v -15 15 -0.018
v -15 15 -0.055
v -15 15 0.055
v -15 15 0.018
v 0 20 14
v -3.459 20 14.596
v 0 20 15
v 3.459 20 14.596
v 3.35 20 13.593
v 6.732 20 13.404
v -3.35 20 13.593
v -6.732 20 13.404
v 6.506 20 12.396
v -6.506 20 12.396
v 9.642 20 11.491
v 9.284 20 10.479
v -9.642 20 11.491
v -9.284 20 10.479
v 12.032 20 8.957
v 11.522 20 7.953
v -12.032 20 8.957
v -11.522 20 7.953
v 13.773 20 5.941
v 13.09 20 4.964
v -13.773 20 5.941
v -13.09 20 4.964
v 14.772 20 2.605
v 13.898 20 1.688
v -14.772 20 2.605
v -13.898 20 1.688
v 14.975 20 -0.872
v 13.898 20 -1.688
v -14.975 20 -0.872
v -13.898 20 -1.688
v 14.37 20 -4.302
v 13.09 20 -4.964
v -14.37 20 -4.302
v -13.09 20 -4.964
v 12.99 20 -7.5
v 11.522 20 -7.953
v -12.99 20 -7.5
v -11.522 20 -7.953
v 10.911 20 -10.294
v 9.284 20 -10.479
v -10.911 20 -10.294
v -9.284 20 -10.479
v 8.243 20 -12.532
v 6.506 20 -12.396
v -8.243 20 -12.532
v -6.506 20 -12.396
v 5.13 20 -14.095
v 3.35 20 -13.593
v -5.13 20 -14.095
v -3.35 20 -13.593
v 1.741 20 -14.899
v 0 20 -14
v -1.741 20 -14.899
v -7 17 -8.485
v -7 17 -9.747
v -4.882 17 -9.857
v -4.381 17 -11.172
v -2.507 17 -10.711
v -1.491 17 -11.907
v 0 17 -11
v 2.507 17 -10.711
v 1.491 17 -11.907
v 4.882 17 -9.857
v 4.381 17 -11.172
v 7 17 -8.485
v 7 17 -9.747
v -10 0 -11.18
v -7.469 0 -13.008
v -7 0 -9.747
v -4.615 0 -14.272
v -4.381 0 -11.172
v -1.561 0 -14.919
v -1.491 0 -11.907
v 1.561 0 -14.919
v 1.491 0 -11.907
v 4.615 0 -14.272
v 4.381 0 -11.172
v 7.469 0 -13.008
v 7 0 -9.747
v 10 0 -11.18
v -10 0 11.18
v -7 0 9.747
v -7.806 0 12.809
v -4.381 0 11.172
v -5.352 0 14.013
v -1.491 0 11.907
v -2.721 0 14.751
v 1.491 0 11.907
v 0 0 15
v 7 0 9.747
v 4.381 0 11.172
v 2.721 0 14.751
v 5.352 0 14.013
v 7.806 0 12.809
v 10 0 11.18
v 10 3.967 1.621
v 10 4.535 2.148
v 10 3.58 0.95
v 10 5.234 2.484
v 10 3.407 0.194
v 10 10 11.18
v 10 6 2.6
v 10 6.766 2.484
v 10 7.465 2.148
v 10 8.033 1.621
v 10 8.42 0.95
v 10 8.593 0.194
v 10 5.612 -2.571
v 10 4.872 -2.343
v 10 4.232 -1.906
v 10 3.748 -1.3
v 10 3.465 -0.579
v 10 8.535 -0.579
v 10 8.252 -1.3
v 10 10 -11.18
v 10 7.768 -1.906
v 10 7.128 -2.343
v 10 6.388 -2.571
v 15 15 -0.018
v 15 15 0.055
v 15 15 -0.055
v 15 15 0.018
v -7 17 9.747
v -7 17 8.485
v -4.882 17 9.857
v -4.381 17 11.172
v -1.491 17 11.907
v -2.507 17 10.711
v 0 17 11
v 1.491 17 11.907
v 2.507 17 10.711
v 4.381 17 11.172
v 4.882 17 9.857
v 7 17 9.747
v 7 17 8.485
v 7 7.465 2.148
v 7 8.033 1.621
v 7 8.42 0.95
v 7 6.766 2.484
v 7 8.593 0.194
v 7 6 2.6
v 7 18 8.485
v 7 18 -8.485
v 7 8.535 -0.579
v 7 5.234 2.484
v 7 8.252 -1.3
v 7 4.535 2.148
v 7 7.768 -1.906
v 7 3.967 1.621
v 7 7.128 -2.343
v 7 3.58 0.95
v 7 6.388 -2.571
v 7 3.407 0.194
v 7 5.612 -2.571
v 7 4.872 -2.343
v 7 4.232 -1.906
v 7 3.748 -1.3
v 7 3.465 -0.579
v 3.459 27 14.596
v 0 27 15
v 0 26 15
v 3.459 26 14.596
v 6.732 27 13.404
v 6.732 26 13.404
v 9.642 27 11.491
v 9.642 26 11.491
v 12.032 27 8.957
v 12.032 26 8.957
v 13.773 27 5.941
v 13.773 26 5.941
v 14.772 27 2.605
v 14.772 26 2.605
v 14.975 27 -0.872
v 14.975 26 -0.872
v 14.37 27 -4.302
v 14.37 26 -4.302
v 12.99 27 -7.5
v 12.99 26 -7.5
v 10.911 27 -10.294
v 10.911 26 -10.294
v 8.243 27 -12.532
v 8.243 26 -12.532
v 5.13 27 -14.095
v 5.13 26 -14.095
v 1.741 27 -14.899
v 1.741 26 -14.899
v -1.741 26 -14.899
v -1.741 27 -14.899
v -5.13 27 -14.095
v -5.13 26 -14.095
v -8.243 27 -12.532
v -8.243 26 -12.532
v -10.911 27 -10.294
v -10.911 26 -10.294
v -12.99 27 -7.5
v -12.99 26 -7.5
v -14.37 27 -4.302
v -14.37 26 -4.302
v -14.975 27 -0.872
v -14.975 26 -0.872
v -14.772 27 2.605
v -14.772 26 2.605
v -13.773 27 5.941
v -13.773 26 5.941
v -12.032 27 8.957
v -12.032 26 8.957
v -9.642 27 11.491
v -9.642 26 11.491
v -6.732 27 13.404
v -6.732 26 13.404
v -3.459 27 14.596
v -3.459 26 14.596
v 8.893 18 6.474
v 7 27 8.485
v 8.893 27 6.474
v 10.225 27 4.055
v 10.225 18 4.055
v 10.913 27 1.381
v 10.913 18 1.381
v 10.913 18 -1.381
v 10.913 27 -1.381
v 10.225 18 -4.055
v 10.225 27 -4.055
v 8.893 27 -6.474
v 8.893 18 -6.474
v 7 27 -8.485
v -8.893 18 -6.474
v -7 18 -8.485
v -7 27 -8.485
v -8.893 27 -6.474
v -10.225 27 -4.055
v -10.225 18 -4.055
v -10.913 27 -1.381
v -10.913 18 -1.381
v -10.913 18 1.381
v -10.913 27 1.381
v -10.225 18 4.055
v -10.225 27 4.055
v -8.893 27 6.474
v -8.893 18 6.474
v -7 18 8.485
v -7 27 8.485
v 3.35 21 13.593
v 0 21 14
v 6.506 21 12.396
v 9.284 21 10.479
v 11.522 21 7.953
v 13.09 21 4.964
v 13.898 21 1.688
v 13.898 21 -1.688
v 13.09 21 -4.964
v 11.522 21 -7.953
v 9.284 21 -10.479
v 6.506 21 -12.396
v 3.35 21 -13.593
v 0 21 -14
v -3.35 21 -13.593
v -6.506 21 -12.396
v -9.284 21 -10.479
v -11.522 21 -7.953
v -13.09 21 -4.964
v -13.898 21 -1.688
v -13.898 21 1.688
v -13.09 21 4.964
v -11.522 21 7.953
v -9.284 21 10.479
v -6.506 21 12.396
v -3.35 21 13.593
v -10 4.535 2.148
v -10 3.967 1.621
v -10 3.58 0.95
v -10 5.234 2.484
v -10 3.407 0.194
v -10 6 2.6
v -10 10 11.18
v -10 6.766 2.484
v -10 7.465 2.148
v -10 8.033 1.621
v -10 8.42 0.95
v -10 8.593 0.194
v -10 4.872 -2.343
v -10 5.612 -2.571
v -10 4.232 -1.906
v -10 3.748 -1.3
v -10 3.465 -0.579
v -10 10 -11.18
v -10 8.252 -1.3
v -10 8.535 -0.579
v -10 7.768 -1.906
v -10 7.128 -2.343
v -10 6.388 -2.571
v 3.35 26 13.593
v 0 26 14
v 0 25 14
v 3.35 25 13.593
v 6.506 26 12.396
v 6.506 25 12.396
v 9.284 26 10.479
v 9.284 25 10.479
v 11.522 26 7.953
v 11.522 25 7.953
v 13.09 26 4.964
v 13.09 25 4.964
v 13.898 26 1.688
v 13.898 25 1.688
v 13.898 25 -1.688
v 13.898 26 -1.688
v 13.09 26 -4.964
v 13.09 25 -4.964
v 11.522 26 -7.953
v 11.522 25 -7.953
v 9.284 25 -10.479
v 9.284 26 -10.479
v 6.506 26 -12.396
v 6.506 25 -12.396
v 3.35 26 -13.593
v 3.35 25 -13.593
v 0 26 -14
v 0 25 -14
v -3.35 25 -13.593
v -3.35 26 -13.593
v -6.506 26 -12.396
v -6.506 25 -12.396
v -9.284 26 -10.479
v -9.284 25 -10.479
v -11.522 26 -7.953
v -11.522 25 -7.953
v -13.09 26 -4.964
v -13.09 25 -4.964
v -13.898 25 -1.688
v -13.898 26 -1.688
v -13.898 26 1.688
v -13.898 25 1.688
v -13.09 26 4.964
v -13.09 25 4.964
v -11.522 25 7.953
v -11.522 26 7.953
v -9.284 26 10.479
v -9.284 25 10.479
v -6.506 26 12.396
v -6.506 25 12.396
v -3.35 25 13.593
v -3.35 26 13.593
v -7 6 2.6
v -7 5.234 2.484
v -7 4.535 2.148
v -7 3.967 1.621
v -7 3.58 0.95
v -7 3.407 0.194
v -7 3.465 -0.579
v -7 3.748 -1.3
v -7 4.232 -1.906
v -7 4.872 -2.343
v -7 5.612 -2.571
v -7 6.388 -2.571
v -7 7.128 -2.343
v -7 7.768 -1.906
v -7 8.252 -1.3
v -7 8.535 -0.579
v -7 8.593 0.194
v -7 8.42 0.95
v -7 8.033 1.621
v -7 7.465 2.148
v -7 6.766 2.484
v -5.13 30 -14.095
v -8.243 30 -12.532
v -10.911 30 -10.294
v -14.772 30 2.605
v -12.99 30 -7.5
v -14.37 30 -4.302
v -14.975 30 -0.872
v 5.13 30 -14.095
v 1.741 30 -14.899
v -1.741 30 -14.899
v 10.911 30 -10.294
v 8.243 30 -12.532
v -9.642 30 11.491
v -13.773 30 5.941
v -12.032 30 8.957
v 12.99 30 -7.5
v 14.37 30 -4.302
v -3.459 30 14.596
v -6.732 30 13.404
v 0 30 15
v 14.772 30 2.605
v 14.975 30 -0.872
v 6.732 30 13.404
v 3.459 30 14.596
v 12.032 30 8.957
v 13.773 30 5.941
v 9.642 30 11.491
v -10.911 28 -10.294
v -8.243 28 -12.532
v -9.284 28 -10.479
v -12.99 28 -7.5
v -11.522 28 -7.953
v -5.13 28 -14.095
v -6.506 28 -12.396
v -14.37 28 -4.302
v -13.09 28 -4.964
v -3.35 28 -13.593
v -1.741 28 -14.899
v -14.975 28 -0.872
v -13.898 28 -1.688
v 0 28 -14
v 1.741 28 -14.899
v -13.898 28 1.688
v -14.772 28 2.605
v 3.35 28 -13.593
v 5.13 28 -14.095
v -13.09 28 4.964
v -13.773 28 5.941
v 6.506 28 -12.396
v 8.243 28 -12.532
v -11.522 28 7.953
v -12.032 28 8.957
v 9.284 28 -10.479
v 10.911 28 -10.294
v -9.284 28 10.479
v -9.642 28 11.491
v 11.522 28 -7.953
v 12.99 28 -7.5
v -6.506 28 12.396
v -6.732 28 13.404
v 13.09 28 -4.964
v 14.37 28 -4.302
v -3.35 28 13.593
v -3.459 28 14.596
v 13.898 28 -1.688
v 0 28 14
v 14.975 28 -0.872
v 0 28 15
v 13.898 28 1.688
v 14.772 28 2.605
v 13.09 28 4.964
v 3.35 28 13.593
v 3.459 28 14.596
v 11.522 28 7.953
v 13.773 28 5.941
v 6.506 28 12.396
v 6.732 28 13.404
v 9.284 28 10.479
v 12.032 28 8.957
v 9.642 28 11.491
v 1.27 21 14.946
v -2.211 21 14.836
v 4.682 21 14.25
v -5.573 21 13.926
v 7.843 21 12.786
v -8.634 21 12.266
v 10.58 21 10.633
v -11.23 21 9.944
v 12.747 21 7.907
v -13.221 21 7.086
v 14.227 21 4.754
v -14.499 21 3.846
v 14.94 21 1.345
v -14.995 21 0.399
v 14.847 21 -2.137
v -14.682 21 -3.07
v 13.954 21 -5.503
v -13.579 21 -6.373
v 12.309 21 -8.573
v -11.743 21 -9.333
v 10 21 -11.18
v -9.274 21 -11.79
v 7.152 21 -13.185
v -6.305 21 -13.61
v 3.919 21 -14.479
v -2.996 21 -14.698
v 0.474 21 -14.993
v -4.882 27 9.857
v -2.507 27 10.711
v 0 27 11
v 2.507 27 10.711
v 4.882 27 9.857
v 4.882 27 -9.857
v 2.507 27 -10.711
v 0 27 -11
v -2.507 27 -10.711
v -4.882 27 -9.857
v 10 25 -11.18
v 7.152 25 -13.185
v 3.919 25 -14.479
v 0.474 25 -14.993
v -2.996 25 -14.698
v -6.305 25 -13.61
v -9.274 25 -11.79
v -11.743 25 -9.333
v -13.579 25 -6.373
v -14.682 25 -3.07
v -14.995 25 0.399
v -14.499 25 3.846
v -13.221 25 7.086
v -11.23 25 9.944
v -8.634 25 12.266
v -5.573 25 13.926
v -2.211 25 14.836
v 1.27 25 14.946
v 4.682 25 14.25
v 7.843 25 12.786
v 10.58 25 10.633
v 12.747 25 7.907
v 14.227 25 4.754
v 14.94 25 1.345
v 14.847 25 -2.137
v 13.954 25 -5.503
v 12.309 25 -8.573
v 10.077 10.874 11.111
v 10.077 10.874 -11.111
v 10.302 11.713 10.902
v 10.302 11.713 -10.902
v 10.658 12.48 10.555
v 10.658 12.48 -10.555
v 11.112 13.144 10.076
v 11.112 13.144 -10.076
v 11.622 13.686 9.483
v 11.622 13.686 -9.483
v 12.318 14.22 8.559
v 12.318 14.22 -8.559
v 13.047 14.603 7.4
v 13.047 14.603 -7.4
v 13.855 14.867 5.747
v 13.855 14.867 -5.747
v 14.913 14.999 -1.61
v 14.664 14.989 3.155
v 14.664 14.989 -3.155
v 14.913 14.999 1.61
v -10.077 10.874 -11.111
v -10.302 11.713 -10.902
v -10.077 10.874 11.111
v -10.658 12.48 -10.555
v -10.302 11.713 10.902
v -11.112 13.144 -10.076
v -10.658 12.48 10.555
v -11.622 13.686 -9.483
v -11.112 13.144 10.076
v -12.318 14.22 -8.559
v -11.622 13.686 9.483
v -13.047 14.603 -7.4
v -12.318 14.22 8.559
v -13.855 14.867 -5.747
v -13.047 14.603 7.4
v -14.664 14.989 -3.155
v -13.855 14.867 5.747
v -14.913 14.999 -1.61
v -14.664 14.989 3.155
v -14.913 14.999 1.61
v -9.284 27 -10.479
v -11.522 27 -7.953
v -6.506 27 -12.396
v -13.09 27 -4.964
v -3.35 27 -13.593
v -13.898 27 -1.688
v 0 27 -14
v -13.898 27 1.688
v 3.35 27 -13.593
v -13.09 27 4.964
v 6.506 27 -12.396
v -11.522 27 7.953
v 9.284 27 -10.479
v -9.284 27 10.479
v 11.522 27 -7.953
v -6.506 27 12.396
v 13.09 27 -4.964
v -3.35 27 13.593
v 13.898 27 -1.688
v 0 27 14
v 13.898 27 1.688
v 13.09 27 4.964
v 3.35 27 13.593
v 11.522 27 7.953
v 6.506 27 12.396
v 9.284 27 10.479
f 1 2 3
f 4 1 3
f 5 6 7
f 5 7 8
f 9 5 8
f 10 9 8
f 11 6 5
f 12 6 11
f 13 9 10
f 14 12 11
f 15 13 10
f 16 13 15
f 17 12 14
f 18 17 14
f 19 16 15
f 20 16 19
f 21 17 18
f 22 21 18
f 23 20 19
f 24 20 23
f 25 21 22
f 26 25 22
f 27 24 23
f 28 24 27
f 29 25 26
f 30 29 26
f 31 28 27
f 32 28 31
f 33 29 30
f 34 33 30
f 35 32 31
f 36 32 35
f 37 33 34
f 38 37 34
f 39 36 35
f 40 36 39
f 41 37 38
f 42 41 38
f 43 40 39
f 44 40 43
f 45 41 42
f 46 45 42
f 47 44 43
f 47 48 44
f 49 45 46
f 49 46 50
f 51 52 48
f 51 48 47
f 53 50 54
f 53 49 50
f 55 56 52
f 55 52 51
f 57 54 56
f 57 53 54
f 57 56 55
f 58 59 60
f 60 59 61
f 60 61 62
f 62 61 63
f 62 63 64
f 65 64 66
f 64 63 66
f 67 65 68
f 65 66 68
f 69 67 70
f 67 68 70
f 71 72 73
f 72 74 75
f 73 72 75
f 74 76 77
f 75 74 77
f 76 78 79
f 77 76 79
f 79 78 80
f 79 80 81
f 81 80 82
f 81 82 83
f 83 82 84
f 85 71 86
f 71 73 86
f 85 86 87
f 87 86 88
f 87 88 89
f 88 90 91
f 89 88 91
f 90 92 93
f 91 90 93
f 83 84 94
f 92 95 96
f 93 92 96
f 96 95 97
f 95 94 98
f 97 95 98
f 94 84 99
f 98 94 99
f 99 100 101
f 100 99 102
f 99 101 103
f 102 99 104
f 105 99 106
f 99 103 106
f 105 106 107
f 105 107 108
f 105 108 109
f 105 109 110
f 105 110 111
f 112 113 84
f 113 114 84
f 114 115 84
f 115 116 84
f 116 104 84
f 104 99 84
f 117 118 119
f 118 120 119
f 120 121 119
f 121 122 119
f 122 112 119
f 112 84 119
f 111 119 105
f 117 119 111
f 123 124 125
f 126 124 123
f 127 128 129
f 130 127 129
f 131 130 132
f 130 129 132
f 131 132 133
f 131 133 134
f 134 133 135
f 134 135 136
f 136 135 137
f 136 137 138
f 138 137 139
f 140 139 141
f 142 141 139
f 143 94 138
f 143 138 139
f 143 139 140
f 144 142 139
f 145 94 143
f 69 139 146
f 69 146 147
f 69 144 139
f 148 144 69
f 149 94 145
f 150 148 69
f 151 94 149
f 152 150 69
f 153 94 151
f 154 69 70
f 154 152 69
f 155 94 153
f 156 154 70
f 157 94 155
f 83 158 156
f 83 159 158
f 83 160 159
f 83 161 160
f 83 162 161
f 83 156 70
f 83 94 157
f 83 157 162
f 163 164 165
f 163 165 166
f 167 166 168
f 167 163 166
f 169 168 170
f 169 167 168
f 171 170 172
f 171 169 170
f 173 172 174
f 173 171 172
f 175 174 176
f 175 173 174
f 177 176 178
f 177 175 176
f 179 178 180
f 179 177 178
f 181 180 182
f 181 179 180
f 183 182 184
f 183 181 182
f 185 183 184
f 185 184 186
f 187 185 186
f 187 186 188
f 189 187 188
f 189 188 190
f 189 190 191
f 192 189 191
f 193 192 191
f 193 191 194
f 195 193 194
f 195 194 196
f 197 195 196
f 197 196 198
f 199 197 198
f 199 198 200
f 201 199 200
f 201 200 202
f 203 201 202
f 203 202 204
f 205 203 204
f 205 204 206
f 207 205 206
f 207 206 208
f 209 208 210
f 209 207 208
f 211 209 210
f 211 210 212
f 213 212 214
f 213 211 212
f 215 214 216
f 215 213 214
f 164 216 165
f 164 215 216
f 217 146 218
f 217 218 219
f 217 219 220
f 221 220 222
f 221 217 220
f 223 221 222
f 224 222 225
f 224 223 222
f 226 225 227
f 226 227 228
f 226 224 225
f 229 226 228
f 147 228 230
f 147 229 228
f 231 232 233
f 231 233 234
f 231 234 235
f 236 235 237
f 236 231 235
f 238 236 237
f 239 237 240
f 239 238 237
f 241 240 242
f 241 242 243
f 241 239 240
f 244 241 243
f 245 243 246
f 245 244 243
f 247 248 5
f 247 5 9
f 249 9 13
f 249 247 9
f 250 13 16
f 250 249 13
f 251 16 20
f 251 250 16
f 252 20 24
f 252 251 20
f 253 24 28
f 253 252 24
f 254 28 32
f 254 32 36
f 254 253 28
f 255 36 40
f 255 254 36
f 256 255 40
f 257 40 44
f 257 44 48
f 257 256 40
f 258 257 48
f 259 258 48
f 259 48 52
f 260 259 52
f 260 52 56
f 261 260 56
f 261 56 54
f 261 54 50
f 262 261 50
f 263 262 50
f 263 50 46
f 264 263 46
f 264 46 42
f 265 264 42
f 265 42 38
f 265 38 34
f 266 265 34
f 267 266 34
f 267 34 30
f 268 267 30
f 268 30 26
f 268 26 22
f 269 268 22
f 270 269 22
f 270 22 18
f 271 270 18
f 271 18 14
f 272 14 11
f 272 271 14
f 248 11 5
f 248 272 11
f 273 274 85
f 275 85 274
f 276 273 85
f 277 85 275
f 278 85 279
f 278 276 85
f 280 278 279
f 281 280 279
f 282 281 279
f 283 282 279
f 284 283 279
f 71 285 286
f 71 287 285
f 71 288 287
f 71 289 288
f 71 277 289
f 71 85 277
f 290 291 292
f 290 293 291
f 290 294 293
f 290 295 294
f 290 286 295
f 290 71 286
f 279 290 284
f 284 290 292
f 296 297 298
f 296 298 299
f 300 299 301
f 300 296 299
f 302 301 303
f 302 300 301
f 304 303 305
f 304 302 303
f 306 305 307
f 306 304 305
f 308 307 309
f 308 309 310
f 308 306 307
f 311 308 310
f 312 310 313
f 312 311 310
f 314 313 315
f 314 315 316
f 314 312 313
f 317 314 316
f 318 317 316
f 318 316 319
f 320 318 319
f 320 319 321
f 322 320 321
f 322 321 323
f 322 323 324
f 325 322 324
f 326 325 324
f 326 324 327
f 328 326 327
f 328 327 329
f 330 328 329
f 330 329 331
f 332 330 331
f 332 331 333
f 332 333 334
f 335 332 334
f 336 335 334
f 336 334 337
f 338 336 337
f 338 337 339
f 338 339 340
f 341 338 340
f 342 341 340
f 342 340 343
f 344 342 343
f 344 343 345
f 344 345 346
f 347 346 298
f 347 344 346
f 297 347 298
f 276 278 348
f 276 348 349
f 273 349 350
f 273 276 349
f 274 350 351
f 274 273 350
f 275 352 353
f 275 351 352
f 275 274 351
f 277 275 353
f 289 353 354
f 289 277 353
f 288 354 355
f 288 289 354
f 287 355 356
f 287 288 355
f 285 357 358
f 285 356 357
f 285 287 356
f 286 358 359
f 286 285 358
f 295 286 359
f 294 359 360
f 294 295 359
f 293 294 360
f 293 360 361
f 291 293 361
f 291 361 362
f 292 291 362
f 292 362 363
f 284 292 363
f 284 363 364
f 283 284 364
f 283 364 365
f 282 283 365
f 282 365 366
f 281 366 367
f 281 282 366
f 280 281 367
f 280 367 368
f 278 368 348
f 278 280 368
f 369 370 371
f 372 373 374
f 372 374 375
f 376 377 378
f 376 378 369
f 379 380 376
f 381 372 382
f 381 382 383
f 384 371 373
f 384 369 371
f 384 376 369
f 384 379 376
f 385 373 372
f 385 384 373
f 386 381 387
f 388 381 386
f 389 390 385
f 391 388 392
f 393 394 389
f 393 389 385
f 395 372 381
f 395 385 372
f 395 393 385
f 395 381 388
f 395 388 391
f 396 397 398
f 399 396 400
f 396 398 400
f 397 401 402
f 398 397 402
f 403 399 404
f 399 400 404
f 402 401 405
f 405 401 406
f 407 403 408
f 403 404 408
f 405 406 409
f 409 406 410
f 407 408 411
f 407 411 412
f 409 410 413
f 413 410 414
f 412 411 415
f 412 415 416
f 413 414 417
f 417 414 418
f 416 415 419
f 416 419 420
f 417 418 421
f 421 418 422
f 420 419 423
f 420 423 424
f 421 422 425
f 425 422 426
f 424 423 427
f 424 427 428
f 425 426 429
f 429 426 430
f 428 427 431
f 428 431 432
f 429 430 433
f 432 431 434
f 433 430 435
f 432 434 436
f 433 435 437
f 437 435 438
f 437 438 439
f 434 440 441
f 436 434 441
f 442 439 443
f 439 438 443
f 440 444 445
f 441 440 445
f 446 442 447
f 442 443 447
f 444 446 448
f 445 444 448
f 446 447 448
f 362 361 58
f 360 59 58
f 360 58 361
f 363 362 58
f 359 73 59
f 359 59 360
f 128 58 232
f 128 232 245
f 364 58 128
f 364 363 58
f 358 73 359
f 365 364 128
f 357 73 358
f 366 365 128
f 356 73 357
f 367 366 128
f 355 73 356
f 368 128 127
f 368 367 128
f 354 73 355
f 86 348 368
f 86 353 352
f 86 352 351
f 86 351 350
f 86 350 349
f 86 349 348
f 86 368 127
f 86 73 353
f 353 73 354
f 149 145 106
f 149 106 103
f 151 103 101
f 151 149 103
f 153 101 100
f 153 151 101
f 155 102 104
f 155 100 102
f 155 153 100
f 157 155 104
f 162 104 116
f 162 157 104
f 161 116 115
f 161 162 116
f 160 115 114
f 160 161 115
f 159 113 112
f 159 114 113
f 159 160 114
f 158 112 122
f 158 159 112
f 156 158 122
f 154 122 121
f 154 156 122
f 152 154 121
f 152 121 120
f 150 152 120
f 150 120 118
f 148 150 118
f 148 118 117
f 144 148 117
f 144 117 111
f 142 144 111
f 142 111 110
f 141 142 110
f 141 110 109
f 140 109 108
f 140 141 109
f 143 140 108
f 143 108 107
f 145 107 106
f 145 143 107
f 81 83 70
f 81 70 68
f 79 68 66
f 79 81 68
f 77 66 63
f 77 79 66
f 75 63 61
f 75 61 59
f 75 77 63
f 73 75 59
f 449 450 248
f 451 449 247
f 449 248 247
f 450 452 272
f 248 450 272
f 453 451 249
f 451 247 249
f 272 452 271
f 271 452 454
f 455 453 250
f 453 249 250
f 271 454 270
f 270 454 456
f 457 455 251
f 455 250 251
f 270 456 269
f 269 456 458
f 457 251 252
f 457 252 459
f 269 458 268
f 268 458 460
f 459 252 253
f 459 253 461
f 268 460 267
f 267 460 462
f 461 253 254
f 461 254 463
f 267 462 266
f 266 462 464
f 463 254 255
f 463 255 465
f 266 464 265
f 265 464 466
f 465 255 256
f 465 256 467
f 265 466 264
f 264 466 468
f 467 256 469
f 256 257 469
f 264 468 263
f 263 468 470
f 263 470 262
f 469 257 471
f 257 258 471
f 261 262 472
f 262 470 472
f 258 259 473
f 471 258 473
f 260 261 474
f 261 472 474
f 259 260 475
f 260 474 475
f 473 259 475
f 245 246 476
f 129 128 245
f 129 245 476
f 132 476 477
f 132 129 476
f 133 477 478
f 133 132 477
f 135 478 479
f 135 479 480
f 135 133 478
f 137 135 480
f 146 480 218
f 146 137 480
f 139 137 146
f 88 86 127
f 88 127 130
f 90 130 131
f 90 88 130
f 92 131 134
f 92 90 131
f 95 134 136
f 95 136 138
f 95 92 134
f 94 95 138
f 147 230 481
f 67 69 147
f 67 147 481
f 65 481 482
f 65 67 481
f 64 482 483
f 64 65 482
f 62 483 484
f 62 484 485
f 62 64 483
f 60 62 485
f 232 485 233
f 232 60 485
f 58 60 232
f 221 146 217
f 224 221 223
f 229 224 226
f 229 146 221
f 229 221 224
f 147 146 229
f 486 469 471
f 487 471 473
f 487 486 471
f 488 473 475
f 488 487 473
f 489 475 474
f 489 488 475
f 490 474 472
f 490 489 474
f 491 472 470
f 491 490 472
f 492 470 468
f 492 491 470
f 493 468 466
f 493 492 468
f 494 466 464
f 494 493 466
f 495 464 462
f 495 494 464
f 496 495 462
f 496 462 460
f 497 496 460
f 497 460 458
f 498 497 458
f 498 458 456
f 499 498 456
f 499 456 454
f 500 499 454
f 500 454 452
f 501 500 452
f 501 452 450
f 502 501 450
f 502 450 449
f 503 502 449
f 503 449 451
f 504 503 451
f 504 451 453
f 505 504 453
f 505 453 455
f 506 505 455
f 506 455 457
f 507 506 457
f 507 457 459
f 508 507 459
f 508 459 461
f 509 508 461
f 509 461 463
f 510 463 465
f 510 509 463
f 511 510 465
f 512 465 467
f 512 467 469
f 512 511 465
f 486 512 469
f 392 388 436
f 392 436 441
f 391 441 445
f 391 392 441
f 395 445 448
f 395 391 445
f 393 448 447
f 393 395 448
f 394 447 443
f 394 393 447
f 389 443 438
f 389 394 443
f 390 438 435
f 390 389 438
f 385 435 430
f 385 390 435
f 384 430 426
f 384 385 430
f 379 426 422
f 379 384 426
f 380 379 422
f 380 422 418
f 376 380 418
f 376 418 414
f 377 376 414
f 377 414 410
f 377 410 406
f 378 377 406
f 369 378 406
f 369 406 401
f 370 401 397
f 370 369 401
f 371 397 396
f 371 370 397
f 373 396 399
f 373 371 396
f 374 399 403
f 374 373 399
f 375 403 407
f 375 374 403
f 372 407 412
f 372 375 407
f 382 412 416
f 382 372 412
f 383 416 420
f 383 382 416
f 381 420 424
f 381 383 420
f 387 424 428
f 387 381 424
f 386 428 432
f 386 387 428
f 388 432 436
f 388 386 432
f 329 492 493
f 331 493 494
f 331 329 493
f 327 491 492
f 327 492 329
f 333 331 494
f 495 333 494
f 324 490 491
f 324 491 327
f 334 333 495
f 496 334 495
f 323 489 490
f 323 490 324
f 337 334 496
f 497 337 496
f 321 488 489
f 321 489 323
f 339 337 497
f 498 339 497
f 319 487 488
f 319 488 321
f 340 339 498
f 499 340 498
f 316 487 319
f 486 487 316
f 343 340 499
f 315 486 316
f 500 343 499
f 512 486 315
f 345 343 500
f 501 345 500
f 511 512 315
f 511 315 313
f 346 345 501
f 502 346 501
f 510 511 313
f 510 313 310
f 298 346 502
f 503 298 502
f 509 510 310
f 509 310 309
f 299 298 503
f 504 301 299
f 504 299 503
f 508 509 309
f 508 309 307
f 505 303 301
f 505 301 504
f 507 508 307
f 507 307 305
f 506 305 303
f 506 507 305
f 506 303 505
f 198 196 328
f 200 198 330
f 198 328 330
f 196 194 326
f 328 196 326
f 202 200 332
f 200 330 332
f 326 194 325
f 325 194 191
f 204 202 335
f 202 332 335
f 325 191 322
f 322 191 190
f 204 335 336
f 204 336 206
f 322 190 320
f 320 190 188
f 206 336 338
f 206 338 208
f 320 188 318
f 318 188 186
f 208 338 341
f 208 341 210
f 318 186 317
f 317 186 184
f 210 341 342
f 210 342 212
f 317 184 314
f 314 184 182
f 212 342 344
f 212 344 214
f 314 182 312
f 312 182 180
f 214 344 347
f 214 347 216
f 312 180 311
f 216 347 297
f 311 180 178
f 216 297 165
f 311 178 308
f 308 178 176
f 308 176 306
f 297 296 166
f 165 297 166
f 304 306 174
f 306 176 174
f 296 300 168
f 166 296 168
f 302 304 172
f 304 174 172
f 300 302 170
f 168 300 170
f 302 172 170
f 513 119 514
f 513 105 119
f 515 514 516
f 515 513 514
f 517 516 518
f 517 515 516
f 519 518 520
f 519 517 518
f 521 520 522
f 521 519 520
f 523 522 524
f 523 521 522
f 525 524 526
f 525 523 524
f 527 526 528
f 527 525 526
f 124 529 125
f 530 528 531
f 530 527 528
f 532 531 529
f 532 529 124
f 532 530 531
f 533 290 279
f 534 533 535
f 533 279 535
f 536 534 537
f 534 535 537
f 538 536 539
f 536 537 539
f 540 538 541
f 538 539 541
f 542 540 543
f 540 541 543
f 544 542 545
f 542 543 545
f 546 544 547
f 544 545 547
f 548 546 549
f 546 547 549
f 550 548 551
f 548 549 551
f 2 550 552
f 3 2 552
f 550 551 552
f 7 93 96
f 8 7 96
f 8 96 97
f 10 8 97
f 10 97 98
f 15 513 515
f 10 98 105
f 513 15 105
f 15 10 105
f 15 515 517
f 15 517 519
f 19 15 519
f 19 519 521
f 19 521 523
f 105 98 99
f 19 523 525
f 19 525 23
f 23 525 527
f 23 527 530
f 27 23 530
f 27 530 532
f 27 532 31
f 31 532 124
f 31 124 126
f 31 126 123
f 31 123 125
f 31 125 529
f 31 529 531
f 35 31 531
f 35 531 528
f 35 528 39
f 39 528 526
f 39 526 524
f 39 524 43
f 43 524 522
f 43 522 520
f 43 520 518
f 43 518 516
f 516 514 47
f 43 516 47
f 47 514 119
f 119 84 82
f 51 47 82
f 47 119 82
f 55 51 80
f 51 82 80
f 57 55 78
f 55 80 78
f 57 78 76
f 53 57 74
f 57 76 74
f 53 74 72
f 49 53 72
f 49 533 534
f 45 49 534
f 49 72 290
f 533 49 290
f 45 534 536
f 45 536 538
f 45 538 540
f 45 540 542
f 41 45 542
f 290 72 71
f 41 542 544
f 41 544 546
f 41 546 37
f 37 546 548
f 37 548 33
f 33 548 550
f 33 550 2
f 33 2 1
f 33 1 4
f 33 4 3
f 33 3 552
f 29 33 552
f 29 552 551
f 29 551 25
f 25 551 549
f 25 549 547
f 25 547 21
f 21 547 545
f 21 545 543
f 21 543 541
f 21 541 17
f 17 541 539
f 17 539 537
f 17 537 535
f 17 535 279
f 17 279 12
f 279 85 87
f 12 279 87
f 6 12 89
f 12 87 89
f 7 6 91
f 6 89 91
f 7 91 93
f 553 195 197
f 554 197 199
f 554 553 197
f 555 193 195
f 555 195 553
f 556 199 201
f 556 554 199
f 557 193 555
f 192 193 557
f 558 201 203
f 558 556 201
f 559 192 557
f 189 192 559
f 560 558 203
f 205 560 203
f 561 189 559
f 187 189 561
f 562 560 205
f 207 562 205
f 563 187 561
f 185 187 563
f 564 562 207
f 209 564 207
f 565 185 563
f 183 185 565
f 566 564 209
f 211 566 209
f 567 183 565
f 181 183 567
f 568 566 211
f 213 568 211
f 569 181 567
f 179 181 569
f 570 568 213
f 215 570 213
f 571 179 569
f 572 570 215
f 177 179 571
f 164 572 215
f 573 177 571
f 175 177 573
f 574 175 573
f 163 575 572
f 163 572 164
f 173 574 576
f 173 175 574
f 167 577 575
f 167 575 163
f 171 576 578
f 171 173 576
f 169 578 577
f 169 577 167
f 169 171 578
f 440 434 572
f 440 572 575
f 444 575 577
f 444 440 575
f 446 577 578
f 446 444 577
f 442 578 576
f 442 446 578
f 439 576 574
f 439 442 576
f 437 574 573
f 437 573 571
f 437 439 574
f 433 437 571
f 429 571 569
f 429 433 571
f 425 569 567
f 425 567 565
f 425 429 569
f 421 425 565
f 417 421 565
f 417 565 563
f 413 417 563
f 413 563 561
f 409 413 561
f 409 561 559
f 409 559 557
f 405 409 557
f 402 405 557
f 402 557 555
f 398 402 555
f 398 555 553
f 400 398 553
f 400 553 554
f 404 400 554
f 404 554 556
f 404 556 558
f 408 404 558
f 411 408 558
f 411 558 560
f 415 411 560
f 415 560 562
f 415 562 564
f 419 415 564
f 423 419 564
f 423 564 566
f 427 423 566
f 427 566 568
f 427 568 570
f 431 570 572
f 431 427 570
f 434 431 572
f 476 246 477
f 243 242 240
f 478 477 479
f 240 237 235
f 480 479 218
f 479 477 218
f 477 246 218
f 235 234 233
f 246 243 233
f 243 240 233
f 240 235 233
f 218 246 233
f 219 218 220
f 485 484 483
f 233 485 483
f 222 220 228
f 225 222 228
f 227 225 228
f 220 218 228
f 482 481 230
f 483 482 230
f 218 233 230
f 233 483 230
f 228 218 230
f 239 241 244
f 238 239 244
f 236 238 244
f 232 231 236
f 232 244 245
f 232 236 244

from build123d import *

# Parameters (mm, degrees)
SKETCH1_R               = 15
BOSS_EXTRUDE1_DEPTH     = 30
CUT_EXTRUDE3_DEPTH      = 37.742346142
CUT_EXTRUDE3_DEPTH_BACK = 37.742346142
SKETCH5_W               = 5
SKETCH5_H               = 15
CUT_EXTRUDE5_START      = -10
SKETCH6_R               = 15
CUT_EXTRUDE5_DEPTH      = 10
SKETCH6_4_R             = 14
BOSS_EXTRUDE2_DEPTH     = 10
SKETCH6_5_R             = 15
SKETCH6_5_R_2           = 14
BOSS_EXTRUDE3_DEPTH     = 9
SKETCH6_6_R             = 15
SKETCH6_6_R_2           = 14
CUT_EXTRUDE6_DEPTH      = 5
SKETCH6_7_R             = 15
SKETCH6_7_R_2           = 14
BOSS_EXTRUDE4_DEPTH     = 4
SKETCH6_8_R             = 15
SKETCH6_8_R_2           = 14
CUT_EXTRUDE7_DEPTH      = 3
SKETCH6_9_R             = 15
SKETCH6_9_R_2           = 14
BOSS_EXTRUDE5_DEPTH     = 2
SHELL2_DEPTH            = 27
SHELL2_START            = 18
SHELL2_2_DEPTH          = 9
SHELL2_3_DEPTH          = 17
CUT_EXTRUDE2_DEPTH      = 37.742346142
CUT_EXTRUDE2_DEPTH_BACK = 37.742346142
SKETCH4_R               = 2.6
FILLET1_R               = 5


# Read off the part's stored shape, not the designer's step: Shell2
with BuildPart() as part:
    # Sketch1 → Boss-Extrude1 (new body)
    with BuildSketch(Plane(origin=(0, 0, 0), x_dir=(1, 0, 0), z_dir=(0, 1, 0))):
        with Locations(Location((0, 0, 0), (0, 0, 270))):
            Circle(SKETCH1_R)
    extrude(amount=BOSS_EXTRUDE1_DEPTH)

    # Sketch5 → Cut-Extrude3 (cut, two sides: drawn at the far end of the back side and taken through both)
    with BuildSketch(Plane.XY.offset(-CUT_EXTRUDE3_DEPTH_BACK)):
        with Locations((-12.5, 7.5)):
            Rectangle(SKETCH5_W, SKETCH5_H)
        with Locations((12.5, 7.5)):
            Rectangle(SKETCH5_W, SKETCH5_H)
    extrude(amount=CUT_EXTRUDE3_DEPTH + CUT_EXTRUDE3_DEPTH_BACK, mode=Mode.SUBTRACT)

    # Sketch6 → Cut-Extrude5 (cut)
    with BuildSketch(Plane(origin=(0, 30, 0), x_dir=(1, 0, 0), z_dir=(0, 1, 0)).offset(CUT_EXTRUDE5_START)):
        with Locations(Location((0, 0, 0), (0, 0, 48.189685104))):
            Circle(SKETCH6_R)
    extrude(amount=CUT_EXTRUDE5_DEPTH, mode=Mode.SUBTRACT)

    # Sketch6<4> → Boss-Extrude2 (add)
    with BuildSketch(Plane(origin=(0, 30, 0), x_dir=(1, 0, 0), z_dir=(0, 1, 0))):
        with Locations(Location((0, 0, 0), (0, 0, 270))):
            Circle(SKETCH6_4_R)
    extrude(amount=-BOSS_EXTRUDE2_DEPTH)

    # Sketch6<5> → Boss-Extrude3 (add)
    with BuildSketch(Plane(origin=(0, 30, 0), x_dir=(1, 0, 0), z_dir=(0, 1, 0))):
        with Locations(Location((0, 0, 0), (0, 0, 48.189685104))):
            Circle(SKETCH6_5_R)
        with Locations(Location((0, 0, 0), (0, 0, 270))):
            Circle(SKETCH6_5_R_2, mode=Mode.SUBTRACT)
    extrude(amount=-BOSS_EXTRUDE3_DEPTH)

    # Sketch6<6> → Cut-Extrude6 (cut)
    with BuildSketch(Plane(origin=(0, 30, 0), x_dir=(1, 0, 0), z_dir=(0, 1, 0))):
        with Locations(Location((0, 0, 0), (0, 0, 270))):
            Circle(SKETCH6_6_R)
        with Locations(Location((0, 0, 0), (0, 0, 270))):
            Circle(SKETCH6_6_R_2, mode=Mode.SUBTRACT)
    extrude(amount=-CUT_EXTRUDE6_DEPTH, mode=Mode.SUBTRACT)

    # Sketch6<7> → Boss-Extrude4 (add)
    with BuildSketch(Plane(origin=(0, 30, 0), x_dir=(1, 0, 0), z_dir=(0, 1, 0))):
        with Locations(Location((0, 0, 0), (0, 0, 270))):
            Circle(SKETCH6_7_R)
        with Locations(Location((0, 0, 0), (0, 0, 270))):
            Circle(SKETCH6_7_R_2, mode=Mode.SUBTRACT)
    extrude(amount=-BOSS_EXTRUDE4_DEPTH)

    # Sketch6<8> → Cut-Extrude7 (cut)
    with BuildSketch(Plane(origin=(0, 30, 0), x_dir=(1, 0, 0), z_dir=(0, 1, 0))):
        with Locations(Location((0, 0, 0), (0, 0, 270))):
            Circle(SKETCH6_8_R)
        with Locations(Location((0, 0, 0), (0, 0, 270))):
            Circle(SKETCH6_8_R_2, mode=Mode.SUBTRACT)
    extrude(amount=-CUT_EXTRUDE7_DEPTH, mode=Mode.SUBTRACT)

    # Sketch6<9> → Boss-Extrude5 (add)
    with BuildSketch(Plane(origin=(0, 30, 0), x_dir=(1, 0, 0), z_dir=(0, 1, 0))):
        with Locations(Location((0, 0, 0), (0, 0, 270))):
            Circle(SKETCH6_9_R)
        with Locations(Location((0, 0, 0), (0, 0, 270))):
            Circle(SKETCH6_9_R_2, mode=Mode.SUBTRACT)
    extrude(amount=-BOSS_EXTRUDE5_DEPTH)

    # Shell2 outline → Shell2 (cut)
    with BuildSketch(Plane(origin=(0, 0, 0), x_dir=(1, 0, 0), z_dir=(0, 1, 0))):
        with BuildLine():
            Line((7, -8.485281374), (7, 8.485281374))
            ThreePointArc((7, 8.485281374), (0, 11), (-7, 8.485281374))
            Line((-7, 8.485281374), (-7, -8.485281374))
            ThreePointArc((-7, -8.485281374), (0, -11), (7, -8.485281374))
        make_face()
    extrude(amount=SHELL2_DEPTH, mode=Mode.SUBTRACT)

    # Shell2 2 outline → Shell2 2 (cut)
    with BuildSketch(Plane(origin=(0, 0, 0), x_dir=(1, 0, 0), z_dir=(0, 1, 0)).offset(SHELL2_START)):
        with BuildLine():
            ThreePointArc((7, -8.485281374), (11, 0), (7, 8.485281374))
            Line((7, 8.485281374), (7, -8.485281374))
        make_face()
        with BuildLine():
            Line((-7, -8.485281374), (-7, 8.485281374))
            ThreePointArc((-7, 8.485281374), (-11, 0), (-7, -8.485281374))
        make_face()
    extrude(amount=SHELL2_2_DEPTH, mode=Mode.SUBTRACT)

    # Shell2 3 outline → Shell2 3 (cut)
    with BuildSketch(Plane(origin=(0, 0, 0), x_dir=(1, 0, 0), z_dir=(0, 1, 0))):
        with BuildLine():
            ThreePointArc((-7, 8.485281374), (0, 11), (7, 8.485281374))
            Line((7, 8.485281374), (7, 9.746794345))
            ThreePointArc((7, 9.746794345), (0, 12), (-7, 9.746794345))
            Line((-7, 9.746794345), (-7, 8.485281374))
        make_face()
        with BuildLine():
            Line((7, -9.746794345), (7, -8.485281374))
            ThreePointArc((7, -8.485281374), (0, -11), (-7, -8.485281374))
            Line((-7, -8.485281374), (-7, -9.746794345))
            ThreePointArc((-7, -9.746794345), (0, -12), (7, -9.746794345))
        make_face()
    extrude(amount=SHELL2_3_DEPTH, mode=Mode.SUBTRACT)

    # Sketch4 → Cut-Extrude2 (cut, two sides: drawn at the far end of the back side and taken through both)
    with BuildSketch(Plane(origin=(0, 0, 0), x_dir=(0, 0, -1), z_dir=(1, 0, 0)).offset(-CUT_EXTRUDE2_DEPTH_BACK)):
        with Locations(Location((0, 6, 0), (0, 0, 180))):
            Circle(SKETCH4_R)
    extrude(amount=CUT_EXTRUDE2_DEPTH + CUT_EXTRUDE2_DEPTH_BACK, mode=Mode.SUBTRACT)

    # Fillet1
    fillet1_edges = [part.edges().sort_by_distance(p)[0] for p in [
        (10, 15, 0),
        (-10, 15, 0),
    ]]
    fillet(fillet1_edges, radius=FILLET1_R - 0.0001)  # a hair under: the kernel refuses the full size


solid = part.part
